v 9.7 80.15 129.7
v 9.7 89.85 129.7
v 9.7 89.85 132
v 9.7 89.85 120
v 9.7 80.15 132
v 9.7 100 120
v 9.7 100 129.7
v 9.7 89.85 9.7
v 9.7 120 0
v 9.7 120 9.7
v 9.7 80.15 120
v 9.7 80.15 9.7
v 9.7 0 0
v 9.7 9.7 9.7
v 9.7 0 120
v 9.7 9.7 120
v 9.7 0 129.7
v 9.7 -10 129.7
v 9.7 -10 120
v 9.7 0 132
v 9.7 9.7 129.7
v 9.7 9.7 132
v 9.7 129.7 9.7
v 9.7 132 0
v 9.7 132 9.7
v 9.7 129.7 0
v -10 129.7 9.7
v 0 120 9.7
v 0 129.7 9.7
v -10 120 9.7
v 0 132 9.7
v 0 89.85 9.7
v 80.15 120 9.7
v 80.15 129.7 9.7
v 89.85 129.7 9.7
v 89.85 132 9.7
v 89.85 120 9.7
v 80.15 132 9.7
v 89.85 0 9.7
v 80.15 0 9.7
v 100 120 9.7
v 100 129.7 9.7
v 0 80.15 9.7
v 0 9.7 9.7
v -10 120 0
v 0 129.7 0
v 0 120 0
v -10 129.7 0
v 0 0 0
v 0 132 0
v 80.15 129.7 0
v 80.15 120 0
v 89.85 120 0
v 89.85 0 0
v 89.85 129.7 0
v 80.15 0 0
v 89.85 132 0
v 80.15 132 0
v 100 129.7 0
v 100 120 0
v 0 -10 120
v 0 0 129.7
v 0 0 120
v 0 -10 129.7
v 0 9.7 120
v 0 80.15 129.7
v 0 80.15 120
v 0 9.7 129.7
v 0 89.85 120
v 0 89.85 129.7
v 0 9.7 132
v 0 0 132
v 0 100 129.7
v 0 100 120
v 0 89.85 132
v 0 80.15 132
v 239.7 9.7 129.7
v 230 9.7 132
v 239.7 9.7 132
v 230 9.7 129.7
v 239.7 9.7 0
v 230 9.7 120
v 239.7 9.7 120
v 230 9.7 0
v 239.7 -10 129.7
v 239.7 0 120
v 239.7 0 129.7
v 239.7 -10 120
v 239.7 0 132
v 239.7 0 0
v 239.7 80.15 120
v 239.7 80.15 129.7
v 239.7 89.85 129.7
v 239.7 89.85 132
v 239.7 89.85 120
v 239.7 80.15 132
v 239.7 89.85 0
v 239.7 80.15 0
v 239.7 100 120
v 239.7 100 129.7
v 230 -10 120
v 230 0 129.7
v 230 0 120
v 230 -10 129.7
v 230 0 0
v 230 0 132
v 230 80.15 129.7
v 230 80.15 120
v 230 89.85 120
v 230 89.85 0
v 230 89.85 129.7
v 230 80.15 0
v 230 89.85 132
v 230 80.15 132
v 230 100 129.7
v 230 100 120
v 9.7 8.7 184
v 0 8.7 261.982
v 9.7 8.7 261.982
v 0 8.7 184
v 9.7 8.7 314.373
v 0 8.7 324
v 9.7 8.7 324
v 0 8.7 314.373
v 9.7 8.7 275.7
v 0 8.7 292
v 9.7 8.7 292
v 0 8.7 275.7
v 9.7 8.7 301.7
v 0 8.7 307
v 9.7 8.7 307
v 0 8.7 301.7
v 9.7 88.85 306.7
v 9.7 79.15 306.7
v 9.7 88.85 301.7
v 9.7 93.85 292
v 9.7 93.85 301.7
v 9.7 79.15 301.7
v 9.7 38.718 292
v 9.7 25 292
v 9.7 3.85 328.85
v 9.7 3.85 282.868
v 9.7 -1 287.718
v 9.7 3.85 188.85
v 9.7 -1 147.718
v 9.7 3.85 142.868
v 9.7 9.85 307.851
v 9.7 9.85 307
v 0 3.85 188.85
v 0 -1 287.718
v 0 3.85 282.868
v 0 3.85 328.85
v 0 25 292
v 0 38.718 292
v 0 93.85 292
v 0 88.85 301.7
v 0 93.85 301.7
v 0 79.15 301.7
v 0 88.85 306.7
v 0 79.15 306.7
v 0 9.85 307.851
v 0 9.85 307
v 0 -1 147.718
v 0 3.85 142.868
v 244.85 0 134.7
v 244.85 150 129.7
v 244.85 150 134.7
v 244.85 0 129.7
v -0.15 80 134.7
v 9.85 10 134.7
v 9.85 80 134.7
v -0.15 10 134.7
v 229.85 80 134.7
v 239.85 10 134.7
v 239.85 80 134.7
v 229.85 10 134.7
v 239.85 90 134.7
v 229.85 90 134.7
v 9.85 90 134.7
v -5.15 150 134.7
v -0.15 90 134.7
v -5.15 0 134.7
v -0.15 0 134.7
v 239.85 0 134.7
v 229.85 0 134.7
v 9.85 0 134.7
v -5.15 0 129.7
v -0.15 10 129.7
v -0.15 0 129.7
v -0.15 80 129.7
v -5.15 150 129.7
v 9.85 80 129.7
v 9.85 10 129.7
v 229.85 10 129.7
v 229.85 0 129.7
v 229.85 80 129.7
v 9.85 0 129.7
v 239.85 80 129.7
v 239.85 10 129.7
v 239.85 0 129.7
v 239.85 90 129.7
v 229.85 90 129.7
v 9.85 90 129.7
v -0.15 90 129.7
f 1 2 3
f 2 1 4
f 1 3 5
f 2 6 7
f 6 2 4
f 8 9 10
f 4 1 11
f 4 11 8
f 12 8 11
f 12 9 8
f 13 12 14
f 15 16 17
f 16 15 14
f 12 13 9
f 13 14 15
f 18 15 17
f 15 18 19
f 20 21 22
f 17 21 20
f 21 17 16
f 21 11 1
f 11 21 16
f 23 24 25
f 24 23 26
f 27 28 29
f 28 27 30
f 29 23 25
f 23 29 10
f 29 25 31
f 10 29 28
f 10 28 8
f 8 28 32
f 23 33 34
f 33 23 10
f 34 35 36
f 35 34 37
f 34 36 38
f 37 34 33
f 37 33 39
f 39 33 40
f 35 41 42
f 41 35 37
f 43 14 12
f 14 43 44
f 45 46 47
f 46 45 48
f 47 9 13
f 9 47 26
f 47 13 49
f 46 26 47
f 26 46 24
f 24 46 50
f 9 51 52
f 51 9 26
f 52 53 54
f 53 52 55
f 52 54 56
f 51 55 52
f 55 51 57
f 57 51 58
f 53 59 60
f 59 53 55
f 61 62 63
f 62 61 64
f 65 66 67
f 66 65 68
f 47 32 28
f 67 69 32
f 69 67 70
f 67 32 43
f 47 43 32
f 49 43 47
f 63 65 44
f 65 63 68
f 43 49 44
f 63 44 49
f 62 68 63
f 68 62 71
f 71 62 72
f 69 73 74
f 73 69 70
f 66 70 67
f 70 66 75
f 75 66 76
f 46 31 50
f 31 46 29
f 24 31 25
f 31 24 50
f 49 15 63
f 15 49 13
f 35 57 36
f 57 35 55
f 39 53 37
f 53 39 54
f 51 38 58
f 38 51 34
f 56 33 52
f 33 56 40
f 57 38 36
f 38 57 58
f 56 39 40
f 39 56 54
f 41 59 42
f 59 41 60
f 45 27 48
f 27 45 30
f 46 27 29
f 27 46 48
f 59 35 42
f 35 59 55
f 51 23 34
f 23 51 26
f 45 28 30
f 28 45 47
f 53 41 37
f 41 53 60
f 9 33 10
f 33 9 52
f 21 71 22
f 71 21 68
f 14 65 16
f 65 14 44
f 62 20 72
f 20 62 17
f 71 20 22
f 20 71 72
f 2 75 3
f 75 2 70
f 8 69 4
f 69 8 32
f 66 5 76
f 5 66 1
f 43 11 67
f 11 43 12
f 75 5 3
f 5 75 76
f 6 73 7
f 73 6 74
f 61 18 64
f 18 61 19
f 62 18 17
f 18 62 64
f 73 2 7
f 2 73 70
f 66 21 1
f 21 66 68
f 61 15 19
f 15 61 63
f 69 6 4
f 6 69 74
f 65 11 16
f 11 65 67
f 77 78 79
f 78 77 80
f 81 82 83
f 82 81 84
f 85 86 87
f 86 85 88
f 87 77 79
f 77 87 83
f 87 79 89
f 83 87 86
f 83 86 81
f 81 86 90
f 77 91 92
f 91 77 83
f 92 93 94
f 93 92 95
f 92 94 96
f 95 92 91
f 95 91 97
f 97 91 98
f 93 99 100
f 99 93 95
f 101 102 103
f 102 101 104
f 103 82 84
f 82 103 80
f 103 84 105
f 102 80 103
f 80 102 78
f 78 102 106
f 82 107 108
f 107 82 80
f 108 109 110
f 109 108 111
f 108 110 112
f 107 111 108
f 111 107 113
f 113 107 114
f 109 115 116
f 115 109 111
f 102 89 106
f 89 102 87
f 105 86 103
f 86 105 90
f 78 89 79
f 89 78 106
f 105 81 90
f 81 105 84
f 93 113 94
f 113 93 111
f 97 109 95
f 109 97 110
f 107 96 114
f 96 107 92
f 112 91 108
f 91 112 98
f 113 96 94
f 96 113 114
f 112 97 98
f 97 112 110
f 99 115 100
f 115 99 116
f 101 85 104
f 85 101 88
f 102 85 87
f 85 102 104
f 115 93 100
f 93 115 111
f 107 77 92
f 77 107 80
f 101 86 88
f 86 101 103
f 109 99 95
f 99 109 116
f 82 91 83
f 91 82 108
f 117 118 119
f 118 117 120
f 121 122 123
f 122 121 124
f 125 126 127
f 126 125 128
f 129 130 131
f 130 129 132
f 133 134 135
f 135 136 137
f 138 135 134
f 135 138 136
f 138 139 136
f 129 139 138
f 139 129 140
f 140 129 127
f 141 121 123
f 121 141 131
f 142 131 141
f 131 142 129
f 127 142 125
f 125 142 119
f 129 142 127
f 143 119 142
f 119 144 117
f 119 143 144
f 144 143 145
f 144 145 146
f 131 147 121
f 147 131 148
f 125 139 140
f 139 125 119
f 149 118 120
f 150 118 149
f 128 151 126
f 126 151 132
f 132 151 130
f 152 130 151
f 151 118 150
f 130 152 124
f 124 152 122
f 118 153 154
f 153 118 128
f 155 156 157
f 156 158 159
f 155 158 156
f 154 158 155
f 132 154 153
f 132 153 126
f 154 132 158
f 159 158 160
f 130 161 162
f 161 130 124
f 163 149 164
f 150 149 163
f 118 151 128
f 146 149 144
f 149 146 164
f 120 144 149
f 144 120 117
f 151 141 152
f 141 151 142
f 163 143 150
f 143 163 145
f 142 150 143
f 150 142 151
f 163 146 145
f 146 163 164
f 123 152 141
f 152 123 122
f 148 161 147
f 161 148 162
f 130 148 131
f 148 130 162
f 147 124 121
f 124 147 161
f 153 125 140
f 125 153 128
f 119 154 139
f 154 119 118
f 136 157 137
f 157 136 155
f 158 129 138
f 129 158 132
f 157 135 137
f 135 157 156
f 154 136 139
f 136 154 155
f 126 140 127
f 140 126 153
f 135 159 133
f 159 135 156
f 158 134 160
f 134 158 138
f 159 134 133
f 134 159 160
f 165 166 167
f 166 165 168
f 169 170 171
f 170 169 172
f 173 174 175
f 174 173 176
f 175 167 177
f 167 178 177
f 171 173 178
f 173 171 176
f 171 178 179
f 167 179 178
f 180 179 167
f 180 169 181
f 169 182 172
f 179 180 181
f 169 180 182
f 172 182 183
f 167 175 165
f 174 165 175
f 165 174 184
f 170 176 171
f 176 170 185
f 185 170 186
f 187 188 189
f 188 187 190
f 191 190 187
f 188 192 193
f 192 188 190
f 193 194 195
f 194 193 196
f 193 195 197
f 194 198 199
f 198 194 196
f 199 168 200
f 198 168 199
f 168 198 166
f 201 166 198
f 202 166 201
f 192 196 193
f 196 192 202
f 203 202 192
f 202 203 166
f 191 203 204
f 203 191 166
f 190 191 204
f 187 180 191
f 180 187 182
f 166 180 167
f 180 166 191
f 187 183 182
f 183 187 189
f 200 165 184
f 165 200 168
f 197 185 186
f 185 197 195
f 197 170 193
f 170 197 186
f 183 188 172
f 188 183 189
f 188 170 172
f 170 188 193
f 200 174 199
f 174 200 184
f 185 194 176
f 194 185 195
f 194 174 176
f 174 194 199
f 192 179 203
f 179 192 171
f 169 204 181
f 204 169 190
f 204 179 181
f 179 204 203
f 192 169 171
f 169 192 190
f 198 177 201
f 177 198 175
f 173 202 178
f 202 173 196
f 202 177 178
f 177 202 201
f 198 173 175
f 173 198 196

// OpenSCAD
leg_size = 10 - 0.3;

leg3();


rotate([90,0,90])
leg3();

translate([250-20,0,0])
rotate([90,0,90])
leg3();

translate([0,-1,142])
rotate([90,0,90])
leg2();

translate([-5-0.15,0,120+leg_size])
plate();



module leg3(){
    cube([leg_size, 132, leg_size]);
    
    translate([80+0.15,0,0])
    cube([leg_size, 132, leg_size]);
    
    translate([-10,120,0])
    cube([110, leg_size, leg_size]);
}


module leg(){
    cube([100, leg_size, leg_size]);
    
    
    translate([0,36,0])
    rotate([0,0,-45])
    cube([50, leg_size, leg_size]);
    
    translate([0,124,0])
    mirror([0,1,0])
    rotate([0,0,-45])
    cube([50, leg_size, leg_size]);
    
    difference(){
        cube([leg_size, 190, leg_size]);
        
        translate([leg_size,-8+190,0])
        rotate([0,0,45])
        cube([leg_size, leg_size, leg_size]);
        
        translate([0,140,0])
        difference(){
            cube([leg_size/2, 250, leg_size]);
            
            translate([0,-8,0])
            rotate([0,0,45])
            cube([leg_size, leg_size, leg_size]);
        }
    }
    
    difference(){
        translate([5,150+leg_size+5.3,0])
        cube([leg_size/2+1, leg_size, leg_size]);
    
        translate([10+1,150+leg_size+5.3,0])
        rotate([0,0,10])
        cube([leg_size/2+1, leg_size+2, leg_size]);
    }
    
    translate([5,150,0])
    cube([80+leg_size+0.15, leg_size, leg_size]);
    
    translate([80+0.15,150+leg_size,0])
    cube([leg_size, 5, leg_size]);
    
    
    
}

module leg2(){
    
    translate([0,124,0])
    mirror([0,1,0])
    rotate([0,0,-45])
    cube([50, leg_size, leg_size]);
    
    difference(){
        cube([leg_size, 190, leg_size]);
        
        #translate([0,-8,0])
        rotate([0,0,45])
        cube([leg_size, leg_size, leg_size]);
        
        #difference(){
            translate([leg_size/2,0,0])
            cube([leg_size/2, 50, leg_size]);
            #
            translate([leg_size,50-8,0])
            rotate([0,0,45])
            cube([leg_size, leg_size, leg_size]);
        }
        
        #translate([leg_size,-8+190,0])
        rotate([0,0,45])
        cube([leg_size, leg_size, leg_size]);
        
        translate([0,140,0])
        difference(){
            cube([leg_size/2, 250, leg_size]);
            #
            translate([0,-8,0])
            rotate([0,0,45])
            cube([leg_size, leg_size, leg_size]);
        }
    }
    
        
    difference(){
        translate([5,150+leg_size+5.3,0])
        cube([leg_size/2+1, leg_size, leg_size]);
    
        translate([10+1,150+leg_size+5.3,0])
        rotate([0,0,10])
        cube([leg_size/2+1, leg_size+2, leg_size]);
    }
    
    translate([5,150,0])
    cube([80+leg_size+0.15, leg_size, leg_size]);
    
    translate([80+0.15,150+leg_size,0])
    cube([leg_size, 5, leg_size]);
    
    
    
}

module plate(){
    difference(){
    cube([250,150,5]);
        
    translate([5,0,0])
    cube([10,10,100]);
        
    translate([250-5-10,0,0])
    cube([10,10,100]);
        
    translate([5,80,0])
    cube([10,10,100]);
        
    translate([250-5-10,80,0])
    cube([10,10,100]);
    }
}
